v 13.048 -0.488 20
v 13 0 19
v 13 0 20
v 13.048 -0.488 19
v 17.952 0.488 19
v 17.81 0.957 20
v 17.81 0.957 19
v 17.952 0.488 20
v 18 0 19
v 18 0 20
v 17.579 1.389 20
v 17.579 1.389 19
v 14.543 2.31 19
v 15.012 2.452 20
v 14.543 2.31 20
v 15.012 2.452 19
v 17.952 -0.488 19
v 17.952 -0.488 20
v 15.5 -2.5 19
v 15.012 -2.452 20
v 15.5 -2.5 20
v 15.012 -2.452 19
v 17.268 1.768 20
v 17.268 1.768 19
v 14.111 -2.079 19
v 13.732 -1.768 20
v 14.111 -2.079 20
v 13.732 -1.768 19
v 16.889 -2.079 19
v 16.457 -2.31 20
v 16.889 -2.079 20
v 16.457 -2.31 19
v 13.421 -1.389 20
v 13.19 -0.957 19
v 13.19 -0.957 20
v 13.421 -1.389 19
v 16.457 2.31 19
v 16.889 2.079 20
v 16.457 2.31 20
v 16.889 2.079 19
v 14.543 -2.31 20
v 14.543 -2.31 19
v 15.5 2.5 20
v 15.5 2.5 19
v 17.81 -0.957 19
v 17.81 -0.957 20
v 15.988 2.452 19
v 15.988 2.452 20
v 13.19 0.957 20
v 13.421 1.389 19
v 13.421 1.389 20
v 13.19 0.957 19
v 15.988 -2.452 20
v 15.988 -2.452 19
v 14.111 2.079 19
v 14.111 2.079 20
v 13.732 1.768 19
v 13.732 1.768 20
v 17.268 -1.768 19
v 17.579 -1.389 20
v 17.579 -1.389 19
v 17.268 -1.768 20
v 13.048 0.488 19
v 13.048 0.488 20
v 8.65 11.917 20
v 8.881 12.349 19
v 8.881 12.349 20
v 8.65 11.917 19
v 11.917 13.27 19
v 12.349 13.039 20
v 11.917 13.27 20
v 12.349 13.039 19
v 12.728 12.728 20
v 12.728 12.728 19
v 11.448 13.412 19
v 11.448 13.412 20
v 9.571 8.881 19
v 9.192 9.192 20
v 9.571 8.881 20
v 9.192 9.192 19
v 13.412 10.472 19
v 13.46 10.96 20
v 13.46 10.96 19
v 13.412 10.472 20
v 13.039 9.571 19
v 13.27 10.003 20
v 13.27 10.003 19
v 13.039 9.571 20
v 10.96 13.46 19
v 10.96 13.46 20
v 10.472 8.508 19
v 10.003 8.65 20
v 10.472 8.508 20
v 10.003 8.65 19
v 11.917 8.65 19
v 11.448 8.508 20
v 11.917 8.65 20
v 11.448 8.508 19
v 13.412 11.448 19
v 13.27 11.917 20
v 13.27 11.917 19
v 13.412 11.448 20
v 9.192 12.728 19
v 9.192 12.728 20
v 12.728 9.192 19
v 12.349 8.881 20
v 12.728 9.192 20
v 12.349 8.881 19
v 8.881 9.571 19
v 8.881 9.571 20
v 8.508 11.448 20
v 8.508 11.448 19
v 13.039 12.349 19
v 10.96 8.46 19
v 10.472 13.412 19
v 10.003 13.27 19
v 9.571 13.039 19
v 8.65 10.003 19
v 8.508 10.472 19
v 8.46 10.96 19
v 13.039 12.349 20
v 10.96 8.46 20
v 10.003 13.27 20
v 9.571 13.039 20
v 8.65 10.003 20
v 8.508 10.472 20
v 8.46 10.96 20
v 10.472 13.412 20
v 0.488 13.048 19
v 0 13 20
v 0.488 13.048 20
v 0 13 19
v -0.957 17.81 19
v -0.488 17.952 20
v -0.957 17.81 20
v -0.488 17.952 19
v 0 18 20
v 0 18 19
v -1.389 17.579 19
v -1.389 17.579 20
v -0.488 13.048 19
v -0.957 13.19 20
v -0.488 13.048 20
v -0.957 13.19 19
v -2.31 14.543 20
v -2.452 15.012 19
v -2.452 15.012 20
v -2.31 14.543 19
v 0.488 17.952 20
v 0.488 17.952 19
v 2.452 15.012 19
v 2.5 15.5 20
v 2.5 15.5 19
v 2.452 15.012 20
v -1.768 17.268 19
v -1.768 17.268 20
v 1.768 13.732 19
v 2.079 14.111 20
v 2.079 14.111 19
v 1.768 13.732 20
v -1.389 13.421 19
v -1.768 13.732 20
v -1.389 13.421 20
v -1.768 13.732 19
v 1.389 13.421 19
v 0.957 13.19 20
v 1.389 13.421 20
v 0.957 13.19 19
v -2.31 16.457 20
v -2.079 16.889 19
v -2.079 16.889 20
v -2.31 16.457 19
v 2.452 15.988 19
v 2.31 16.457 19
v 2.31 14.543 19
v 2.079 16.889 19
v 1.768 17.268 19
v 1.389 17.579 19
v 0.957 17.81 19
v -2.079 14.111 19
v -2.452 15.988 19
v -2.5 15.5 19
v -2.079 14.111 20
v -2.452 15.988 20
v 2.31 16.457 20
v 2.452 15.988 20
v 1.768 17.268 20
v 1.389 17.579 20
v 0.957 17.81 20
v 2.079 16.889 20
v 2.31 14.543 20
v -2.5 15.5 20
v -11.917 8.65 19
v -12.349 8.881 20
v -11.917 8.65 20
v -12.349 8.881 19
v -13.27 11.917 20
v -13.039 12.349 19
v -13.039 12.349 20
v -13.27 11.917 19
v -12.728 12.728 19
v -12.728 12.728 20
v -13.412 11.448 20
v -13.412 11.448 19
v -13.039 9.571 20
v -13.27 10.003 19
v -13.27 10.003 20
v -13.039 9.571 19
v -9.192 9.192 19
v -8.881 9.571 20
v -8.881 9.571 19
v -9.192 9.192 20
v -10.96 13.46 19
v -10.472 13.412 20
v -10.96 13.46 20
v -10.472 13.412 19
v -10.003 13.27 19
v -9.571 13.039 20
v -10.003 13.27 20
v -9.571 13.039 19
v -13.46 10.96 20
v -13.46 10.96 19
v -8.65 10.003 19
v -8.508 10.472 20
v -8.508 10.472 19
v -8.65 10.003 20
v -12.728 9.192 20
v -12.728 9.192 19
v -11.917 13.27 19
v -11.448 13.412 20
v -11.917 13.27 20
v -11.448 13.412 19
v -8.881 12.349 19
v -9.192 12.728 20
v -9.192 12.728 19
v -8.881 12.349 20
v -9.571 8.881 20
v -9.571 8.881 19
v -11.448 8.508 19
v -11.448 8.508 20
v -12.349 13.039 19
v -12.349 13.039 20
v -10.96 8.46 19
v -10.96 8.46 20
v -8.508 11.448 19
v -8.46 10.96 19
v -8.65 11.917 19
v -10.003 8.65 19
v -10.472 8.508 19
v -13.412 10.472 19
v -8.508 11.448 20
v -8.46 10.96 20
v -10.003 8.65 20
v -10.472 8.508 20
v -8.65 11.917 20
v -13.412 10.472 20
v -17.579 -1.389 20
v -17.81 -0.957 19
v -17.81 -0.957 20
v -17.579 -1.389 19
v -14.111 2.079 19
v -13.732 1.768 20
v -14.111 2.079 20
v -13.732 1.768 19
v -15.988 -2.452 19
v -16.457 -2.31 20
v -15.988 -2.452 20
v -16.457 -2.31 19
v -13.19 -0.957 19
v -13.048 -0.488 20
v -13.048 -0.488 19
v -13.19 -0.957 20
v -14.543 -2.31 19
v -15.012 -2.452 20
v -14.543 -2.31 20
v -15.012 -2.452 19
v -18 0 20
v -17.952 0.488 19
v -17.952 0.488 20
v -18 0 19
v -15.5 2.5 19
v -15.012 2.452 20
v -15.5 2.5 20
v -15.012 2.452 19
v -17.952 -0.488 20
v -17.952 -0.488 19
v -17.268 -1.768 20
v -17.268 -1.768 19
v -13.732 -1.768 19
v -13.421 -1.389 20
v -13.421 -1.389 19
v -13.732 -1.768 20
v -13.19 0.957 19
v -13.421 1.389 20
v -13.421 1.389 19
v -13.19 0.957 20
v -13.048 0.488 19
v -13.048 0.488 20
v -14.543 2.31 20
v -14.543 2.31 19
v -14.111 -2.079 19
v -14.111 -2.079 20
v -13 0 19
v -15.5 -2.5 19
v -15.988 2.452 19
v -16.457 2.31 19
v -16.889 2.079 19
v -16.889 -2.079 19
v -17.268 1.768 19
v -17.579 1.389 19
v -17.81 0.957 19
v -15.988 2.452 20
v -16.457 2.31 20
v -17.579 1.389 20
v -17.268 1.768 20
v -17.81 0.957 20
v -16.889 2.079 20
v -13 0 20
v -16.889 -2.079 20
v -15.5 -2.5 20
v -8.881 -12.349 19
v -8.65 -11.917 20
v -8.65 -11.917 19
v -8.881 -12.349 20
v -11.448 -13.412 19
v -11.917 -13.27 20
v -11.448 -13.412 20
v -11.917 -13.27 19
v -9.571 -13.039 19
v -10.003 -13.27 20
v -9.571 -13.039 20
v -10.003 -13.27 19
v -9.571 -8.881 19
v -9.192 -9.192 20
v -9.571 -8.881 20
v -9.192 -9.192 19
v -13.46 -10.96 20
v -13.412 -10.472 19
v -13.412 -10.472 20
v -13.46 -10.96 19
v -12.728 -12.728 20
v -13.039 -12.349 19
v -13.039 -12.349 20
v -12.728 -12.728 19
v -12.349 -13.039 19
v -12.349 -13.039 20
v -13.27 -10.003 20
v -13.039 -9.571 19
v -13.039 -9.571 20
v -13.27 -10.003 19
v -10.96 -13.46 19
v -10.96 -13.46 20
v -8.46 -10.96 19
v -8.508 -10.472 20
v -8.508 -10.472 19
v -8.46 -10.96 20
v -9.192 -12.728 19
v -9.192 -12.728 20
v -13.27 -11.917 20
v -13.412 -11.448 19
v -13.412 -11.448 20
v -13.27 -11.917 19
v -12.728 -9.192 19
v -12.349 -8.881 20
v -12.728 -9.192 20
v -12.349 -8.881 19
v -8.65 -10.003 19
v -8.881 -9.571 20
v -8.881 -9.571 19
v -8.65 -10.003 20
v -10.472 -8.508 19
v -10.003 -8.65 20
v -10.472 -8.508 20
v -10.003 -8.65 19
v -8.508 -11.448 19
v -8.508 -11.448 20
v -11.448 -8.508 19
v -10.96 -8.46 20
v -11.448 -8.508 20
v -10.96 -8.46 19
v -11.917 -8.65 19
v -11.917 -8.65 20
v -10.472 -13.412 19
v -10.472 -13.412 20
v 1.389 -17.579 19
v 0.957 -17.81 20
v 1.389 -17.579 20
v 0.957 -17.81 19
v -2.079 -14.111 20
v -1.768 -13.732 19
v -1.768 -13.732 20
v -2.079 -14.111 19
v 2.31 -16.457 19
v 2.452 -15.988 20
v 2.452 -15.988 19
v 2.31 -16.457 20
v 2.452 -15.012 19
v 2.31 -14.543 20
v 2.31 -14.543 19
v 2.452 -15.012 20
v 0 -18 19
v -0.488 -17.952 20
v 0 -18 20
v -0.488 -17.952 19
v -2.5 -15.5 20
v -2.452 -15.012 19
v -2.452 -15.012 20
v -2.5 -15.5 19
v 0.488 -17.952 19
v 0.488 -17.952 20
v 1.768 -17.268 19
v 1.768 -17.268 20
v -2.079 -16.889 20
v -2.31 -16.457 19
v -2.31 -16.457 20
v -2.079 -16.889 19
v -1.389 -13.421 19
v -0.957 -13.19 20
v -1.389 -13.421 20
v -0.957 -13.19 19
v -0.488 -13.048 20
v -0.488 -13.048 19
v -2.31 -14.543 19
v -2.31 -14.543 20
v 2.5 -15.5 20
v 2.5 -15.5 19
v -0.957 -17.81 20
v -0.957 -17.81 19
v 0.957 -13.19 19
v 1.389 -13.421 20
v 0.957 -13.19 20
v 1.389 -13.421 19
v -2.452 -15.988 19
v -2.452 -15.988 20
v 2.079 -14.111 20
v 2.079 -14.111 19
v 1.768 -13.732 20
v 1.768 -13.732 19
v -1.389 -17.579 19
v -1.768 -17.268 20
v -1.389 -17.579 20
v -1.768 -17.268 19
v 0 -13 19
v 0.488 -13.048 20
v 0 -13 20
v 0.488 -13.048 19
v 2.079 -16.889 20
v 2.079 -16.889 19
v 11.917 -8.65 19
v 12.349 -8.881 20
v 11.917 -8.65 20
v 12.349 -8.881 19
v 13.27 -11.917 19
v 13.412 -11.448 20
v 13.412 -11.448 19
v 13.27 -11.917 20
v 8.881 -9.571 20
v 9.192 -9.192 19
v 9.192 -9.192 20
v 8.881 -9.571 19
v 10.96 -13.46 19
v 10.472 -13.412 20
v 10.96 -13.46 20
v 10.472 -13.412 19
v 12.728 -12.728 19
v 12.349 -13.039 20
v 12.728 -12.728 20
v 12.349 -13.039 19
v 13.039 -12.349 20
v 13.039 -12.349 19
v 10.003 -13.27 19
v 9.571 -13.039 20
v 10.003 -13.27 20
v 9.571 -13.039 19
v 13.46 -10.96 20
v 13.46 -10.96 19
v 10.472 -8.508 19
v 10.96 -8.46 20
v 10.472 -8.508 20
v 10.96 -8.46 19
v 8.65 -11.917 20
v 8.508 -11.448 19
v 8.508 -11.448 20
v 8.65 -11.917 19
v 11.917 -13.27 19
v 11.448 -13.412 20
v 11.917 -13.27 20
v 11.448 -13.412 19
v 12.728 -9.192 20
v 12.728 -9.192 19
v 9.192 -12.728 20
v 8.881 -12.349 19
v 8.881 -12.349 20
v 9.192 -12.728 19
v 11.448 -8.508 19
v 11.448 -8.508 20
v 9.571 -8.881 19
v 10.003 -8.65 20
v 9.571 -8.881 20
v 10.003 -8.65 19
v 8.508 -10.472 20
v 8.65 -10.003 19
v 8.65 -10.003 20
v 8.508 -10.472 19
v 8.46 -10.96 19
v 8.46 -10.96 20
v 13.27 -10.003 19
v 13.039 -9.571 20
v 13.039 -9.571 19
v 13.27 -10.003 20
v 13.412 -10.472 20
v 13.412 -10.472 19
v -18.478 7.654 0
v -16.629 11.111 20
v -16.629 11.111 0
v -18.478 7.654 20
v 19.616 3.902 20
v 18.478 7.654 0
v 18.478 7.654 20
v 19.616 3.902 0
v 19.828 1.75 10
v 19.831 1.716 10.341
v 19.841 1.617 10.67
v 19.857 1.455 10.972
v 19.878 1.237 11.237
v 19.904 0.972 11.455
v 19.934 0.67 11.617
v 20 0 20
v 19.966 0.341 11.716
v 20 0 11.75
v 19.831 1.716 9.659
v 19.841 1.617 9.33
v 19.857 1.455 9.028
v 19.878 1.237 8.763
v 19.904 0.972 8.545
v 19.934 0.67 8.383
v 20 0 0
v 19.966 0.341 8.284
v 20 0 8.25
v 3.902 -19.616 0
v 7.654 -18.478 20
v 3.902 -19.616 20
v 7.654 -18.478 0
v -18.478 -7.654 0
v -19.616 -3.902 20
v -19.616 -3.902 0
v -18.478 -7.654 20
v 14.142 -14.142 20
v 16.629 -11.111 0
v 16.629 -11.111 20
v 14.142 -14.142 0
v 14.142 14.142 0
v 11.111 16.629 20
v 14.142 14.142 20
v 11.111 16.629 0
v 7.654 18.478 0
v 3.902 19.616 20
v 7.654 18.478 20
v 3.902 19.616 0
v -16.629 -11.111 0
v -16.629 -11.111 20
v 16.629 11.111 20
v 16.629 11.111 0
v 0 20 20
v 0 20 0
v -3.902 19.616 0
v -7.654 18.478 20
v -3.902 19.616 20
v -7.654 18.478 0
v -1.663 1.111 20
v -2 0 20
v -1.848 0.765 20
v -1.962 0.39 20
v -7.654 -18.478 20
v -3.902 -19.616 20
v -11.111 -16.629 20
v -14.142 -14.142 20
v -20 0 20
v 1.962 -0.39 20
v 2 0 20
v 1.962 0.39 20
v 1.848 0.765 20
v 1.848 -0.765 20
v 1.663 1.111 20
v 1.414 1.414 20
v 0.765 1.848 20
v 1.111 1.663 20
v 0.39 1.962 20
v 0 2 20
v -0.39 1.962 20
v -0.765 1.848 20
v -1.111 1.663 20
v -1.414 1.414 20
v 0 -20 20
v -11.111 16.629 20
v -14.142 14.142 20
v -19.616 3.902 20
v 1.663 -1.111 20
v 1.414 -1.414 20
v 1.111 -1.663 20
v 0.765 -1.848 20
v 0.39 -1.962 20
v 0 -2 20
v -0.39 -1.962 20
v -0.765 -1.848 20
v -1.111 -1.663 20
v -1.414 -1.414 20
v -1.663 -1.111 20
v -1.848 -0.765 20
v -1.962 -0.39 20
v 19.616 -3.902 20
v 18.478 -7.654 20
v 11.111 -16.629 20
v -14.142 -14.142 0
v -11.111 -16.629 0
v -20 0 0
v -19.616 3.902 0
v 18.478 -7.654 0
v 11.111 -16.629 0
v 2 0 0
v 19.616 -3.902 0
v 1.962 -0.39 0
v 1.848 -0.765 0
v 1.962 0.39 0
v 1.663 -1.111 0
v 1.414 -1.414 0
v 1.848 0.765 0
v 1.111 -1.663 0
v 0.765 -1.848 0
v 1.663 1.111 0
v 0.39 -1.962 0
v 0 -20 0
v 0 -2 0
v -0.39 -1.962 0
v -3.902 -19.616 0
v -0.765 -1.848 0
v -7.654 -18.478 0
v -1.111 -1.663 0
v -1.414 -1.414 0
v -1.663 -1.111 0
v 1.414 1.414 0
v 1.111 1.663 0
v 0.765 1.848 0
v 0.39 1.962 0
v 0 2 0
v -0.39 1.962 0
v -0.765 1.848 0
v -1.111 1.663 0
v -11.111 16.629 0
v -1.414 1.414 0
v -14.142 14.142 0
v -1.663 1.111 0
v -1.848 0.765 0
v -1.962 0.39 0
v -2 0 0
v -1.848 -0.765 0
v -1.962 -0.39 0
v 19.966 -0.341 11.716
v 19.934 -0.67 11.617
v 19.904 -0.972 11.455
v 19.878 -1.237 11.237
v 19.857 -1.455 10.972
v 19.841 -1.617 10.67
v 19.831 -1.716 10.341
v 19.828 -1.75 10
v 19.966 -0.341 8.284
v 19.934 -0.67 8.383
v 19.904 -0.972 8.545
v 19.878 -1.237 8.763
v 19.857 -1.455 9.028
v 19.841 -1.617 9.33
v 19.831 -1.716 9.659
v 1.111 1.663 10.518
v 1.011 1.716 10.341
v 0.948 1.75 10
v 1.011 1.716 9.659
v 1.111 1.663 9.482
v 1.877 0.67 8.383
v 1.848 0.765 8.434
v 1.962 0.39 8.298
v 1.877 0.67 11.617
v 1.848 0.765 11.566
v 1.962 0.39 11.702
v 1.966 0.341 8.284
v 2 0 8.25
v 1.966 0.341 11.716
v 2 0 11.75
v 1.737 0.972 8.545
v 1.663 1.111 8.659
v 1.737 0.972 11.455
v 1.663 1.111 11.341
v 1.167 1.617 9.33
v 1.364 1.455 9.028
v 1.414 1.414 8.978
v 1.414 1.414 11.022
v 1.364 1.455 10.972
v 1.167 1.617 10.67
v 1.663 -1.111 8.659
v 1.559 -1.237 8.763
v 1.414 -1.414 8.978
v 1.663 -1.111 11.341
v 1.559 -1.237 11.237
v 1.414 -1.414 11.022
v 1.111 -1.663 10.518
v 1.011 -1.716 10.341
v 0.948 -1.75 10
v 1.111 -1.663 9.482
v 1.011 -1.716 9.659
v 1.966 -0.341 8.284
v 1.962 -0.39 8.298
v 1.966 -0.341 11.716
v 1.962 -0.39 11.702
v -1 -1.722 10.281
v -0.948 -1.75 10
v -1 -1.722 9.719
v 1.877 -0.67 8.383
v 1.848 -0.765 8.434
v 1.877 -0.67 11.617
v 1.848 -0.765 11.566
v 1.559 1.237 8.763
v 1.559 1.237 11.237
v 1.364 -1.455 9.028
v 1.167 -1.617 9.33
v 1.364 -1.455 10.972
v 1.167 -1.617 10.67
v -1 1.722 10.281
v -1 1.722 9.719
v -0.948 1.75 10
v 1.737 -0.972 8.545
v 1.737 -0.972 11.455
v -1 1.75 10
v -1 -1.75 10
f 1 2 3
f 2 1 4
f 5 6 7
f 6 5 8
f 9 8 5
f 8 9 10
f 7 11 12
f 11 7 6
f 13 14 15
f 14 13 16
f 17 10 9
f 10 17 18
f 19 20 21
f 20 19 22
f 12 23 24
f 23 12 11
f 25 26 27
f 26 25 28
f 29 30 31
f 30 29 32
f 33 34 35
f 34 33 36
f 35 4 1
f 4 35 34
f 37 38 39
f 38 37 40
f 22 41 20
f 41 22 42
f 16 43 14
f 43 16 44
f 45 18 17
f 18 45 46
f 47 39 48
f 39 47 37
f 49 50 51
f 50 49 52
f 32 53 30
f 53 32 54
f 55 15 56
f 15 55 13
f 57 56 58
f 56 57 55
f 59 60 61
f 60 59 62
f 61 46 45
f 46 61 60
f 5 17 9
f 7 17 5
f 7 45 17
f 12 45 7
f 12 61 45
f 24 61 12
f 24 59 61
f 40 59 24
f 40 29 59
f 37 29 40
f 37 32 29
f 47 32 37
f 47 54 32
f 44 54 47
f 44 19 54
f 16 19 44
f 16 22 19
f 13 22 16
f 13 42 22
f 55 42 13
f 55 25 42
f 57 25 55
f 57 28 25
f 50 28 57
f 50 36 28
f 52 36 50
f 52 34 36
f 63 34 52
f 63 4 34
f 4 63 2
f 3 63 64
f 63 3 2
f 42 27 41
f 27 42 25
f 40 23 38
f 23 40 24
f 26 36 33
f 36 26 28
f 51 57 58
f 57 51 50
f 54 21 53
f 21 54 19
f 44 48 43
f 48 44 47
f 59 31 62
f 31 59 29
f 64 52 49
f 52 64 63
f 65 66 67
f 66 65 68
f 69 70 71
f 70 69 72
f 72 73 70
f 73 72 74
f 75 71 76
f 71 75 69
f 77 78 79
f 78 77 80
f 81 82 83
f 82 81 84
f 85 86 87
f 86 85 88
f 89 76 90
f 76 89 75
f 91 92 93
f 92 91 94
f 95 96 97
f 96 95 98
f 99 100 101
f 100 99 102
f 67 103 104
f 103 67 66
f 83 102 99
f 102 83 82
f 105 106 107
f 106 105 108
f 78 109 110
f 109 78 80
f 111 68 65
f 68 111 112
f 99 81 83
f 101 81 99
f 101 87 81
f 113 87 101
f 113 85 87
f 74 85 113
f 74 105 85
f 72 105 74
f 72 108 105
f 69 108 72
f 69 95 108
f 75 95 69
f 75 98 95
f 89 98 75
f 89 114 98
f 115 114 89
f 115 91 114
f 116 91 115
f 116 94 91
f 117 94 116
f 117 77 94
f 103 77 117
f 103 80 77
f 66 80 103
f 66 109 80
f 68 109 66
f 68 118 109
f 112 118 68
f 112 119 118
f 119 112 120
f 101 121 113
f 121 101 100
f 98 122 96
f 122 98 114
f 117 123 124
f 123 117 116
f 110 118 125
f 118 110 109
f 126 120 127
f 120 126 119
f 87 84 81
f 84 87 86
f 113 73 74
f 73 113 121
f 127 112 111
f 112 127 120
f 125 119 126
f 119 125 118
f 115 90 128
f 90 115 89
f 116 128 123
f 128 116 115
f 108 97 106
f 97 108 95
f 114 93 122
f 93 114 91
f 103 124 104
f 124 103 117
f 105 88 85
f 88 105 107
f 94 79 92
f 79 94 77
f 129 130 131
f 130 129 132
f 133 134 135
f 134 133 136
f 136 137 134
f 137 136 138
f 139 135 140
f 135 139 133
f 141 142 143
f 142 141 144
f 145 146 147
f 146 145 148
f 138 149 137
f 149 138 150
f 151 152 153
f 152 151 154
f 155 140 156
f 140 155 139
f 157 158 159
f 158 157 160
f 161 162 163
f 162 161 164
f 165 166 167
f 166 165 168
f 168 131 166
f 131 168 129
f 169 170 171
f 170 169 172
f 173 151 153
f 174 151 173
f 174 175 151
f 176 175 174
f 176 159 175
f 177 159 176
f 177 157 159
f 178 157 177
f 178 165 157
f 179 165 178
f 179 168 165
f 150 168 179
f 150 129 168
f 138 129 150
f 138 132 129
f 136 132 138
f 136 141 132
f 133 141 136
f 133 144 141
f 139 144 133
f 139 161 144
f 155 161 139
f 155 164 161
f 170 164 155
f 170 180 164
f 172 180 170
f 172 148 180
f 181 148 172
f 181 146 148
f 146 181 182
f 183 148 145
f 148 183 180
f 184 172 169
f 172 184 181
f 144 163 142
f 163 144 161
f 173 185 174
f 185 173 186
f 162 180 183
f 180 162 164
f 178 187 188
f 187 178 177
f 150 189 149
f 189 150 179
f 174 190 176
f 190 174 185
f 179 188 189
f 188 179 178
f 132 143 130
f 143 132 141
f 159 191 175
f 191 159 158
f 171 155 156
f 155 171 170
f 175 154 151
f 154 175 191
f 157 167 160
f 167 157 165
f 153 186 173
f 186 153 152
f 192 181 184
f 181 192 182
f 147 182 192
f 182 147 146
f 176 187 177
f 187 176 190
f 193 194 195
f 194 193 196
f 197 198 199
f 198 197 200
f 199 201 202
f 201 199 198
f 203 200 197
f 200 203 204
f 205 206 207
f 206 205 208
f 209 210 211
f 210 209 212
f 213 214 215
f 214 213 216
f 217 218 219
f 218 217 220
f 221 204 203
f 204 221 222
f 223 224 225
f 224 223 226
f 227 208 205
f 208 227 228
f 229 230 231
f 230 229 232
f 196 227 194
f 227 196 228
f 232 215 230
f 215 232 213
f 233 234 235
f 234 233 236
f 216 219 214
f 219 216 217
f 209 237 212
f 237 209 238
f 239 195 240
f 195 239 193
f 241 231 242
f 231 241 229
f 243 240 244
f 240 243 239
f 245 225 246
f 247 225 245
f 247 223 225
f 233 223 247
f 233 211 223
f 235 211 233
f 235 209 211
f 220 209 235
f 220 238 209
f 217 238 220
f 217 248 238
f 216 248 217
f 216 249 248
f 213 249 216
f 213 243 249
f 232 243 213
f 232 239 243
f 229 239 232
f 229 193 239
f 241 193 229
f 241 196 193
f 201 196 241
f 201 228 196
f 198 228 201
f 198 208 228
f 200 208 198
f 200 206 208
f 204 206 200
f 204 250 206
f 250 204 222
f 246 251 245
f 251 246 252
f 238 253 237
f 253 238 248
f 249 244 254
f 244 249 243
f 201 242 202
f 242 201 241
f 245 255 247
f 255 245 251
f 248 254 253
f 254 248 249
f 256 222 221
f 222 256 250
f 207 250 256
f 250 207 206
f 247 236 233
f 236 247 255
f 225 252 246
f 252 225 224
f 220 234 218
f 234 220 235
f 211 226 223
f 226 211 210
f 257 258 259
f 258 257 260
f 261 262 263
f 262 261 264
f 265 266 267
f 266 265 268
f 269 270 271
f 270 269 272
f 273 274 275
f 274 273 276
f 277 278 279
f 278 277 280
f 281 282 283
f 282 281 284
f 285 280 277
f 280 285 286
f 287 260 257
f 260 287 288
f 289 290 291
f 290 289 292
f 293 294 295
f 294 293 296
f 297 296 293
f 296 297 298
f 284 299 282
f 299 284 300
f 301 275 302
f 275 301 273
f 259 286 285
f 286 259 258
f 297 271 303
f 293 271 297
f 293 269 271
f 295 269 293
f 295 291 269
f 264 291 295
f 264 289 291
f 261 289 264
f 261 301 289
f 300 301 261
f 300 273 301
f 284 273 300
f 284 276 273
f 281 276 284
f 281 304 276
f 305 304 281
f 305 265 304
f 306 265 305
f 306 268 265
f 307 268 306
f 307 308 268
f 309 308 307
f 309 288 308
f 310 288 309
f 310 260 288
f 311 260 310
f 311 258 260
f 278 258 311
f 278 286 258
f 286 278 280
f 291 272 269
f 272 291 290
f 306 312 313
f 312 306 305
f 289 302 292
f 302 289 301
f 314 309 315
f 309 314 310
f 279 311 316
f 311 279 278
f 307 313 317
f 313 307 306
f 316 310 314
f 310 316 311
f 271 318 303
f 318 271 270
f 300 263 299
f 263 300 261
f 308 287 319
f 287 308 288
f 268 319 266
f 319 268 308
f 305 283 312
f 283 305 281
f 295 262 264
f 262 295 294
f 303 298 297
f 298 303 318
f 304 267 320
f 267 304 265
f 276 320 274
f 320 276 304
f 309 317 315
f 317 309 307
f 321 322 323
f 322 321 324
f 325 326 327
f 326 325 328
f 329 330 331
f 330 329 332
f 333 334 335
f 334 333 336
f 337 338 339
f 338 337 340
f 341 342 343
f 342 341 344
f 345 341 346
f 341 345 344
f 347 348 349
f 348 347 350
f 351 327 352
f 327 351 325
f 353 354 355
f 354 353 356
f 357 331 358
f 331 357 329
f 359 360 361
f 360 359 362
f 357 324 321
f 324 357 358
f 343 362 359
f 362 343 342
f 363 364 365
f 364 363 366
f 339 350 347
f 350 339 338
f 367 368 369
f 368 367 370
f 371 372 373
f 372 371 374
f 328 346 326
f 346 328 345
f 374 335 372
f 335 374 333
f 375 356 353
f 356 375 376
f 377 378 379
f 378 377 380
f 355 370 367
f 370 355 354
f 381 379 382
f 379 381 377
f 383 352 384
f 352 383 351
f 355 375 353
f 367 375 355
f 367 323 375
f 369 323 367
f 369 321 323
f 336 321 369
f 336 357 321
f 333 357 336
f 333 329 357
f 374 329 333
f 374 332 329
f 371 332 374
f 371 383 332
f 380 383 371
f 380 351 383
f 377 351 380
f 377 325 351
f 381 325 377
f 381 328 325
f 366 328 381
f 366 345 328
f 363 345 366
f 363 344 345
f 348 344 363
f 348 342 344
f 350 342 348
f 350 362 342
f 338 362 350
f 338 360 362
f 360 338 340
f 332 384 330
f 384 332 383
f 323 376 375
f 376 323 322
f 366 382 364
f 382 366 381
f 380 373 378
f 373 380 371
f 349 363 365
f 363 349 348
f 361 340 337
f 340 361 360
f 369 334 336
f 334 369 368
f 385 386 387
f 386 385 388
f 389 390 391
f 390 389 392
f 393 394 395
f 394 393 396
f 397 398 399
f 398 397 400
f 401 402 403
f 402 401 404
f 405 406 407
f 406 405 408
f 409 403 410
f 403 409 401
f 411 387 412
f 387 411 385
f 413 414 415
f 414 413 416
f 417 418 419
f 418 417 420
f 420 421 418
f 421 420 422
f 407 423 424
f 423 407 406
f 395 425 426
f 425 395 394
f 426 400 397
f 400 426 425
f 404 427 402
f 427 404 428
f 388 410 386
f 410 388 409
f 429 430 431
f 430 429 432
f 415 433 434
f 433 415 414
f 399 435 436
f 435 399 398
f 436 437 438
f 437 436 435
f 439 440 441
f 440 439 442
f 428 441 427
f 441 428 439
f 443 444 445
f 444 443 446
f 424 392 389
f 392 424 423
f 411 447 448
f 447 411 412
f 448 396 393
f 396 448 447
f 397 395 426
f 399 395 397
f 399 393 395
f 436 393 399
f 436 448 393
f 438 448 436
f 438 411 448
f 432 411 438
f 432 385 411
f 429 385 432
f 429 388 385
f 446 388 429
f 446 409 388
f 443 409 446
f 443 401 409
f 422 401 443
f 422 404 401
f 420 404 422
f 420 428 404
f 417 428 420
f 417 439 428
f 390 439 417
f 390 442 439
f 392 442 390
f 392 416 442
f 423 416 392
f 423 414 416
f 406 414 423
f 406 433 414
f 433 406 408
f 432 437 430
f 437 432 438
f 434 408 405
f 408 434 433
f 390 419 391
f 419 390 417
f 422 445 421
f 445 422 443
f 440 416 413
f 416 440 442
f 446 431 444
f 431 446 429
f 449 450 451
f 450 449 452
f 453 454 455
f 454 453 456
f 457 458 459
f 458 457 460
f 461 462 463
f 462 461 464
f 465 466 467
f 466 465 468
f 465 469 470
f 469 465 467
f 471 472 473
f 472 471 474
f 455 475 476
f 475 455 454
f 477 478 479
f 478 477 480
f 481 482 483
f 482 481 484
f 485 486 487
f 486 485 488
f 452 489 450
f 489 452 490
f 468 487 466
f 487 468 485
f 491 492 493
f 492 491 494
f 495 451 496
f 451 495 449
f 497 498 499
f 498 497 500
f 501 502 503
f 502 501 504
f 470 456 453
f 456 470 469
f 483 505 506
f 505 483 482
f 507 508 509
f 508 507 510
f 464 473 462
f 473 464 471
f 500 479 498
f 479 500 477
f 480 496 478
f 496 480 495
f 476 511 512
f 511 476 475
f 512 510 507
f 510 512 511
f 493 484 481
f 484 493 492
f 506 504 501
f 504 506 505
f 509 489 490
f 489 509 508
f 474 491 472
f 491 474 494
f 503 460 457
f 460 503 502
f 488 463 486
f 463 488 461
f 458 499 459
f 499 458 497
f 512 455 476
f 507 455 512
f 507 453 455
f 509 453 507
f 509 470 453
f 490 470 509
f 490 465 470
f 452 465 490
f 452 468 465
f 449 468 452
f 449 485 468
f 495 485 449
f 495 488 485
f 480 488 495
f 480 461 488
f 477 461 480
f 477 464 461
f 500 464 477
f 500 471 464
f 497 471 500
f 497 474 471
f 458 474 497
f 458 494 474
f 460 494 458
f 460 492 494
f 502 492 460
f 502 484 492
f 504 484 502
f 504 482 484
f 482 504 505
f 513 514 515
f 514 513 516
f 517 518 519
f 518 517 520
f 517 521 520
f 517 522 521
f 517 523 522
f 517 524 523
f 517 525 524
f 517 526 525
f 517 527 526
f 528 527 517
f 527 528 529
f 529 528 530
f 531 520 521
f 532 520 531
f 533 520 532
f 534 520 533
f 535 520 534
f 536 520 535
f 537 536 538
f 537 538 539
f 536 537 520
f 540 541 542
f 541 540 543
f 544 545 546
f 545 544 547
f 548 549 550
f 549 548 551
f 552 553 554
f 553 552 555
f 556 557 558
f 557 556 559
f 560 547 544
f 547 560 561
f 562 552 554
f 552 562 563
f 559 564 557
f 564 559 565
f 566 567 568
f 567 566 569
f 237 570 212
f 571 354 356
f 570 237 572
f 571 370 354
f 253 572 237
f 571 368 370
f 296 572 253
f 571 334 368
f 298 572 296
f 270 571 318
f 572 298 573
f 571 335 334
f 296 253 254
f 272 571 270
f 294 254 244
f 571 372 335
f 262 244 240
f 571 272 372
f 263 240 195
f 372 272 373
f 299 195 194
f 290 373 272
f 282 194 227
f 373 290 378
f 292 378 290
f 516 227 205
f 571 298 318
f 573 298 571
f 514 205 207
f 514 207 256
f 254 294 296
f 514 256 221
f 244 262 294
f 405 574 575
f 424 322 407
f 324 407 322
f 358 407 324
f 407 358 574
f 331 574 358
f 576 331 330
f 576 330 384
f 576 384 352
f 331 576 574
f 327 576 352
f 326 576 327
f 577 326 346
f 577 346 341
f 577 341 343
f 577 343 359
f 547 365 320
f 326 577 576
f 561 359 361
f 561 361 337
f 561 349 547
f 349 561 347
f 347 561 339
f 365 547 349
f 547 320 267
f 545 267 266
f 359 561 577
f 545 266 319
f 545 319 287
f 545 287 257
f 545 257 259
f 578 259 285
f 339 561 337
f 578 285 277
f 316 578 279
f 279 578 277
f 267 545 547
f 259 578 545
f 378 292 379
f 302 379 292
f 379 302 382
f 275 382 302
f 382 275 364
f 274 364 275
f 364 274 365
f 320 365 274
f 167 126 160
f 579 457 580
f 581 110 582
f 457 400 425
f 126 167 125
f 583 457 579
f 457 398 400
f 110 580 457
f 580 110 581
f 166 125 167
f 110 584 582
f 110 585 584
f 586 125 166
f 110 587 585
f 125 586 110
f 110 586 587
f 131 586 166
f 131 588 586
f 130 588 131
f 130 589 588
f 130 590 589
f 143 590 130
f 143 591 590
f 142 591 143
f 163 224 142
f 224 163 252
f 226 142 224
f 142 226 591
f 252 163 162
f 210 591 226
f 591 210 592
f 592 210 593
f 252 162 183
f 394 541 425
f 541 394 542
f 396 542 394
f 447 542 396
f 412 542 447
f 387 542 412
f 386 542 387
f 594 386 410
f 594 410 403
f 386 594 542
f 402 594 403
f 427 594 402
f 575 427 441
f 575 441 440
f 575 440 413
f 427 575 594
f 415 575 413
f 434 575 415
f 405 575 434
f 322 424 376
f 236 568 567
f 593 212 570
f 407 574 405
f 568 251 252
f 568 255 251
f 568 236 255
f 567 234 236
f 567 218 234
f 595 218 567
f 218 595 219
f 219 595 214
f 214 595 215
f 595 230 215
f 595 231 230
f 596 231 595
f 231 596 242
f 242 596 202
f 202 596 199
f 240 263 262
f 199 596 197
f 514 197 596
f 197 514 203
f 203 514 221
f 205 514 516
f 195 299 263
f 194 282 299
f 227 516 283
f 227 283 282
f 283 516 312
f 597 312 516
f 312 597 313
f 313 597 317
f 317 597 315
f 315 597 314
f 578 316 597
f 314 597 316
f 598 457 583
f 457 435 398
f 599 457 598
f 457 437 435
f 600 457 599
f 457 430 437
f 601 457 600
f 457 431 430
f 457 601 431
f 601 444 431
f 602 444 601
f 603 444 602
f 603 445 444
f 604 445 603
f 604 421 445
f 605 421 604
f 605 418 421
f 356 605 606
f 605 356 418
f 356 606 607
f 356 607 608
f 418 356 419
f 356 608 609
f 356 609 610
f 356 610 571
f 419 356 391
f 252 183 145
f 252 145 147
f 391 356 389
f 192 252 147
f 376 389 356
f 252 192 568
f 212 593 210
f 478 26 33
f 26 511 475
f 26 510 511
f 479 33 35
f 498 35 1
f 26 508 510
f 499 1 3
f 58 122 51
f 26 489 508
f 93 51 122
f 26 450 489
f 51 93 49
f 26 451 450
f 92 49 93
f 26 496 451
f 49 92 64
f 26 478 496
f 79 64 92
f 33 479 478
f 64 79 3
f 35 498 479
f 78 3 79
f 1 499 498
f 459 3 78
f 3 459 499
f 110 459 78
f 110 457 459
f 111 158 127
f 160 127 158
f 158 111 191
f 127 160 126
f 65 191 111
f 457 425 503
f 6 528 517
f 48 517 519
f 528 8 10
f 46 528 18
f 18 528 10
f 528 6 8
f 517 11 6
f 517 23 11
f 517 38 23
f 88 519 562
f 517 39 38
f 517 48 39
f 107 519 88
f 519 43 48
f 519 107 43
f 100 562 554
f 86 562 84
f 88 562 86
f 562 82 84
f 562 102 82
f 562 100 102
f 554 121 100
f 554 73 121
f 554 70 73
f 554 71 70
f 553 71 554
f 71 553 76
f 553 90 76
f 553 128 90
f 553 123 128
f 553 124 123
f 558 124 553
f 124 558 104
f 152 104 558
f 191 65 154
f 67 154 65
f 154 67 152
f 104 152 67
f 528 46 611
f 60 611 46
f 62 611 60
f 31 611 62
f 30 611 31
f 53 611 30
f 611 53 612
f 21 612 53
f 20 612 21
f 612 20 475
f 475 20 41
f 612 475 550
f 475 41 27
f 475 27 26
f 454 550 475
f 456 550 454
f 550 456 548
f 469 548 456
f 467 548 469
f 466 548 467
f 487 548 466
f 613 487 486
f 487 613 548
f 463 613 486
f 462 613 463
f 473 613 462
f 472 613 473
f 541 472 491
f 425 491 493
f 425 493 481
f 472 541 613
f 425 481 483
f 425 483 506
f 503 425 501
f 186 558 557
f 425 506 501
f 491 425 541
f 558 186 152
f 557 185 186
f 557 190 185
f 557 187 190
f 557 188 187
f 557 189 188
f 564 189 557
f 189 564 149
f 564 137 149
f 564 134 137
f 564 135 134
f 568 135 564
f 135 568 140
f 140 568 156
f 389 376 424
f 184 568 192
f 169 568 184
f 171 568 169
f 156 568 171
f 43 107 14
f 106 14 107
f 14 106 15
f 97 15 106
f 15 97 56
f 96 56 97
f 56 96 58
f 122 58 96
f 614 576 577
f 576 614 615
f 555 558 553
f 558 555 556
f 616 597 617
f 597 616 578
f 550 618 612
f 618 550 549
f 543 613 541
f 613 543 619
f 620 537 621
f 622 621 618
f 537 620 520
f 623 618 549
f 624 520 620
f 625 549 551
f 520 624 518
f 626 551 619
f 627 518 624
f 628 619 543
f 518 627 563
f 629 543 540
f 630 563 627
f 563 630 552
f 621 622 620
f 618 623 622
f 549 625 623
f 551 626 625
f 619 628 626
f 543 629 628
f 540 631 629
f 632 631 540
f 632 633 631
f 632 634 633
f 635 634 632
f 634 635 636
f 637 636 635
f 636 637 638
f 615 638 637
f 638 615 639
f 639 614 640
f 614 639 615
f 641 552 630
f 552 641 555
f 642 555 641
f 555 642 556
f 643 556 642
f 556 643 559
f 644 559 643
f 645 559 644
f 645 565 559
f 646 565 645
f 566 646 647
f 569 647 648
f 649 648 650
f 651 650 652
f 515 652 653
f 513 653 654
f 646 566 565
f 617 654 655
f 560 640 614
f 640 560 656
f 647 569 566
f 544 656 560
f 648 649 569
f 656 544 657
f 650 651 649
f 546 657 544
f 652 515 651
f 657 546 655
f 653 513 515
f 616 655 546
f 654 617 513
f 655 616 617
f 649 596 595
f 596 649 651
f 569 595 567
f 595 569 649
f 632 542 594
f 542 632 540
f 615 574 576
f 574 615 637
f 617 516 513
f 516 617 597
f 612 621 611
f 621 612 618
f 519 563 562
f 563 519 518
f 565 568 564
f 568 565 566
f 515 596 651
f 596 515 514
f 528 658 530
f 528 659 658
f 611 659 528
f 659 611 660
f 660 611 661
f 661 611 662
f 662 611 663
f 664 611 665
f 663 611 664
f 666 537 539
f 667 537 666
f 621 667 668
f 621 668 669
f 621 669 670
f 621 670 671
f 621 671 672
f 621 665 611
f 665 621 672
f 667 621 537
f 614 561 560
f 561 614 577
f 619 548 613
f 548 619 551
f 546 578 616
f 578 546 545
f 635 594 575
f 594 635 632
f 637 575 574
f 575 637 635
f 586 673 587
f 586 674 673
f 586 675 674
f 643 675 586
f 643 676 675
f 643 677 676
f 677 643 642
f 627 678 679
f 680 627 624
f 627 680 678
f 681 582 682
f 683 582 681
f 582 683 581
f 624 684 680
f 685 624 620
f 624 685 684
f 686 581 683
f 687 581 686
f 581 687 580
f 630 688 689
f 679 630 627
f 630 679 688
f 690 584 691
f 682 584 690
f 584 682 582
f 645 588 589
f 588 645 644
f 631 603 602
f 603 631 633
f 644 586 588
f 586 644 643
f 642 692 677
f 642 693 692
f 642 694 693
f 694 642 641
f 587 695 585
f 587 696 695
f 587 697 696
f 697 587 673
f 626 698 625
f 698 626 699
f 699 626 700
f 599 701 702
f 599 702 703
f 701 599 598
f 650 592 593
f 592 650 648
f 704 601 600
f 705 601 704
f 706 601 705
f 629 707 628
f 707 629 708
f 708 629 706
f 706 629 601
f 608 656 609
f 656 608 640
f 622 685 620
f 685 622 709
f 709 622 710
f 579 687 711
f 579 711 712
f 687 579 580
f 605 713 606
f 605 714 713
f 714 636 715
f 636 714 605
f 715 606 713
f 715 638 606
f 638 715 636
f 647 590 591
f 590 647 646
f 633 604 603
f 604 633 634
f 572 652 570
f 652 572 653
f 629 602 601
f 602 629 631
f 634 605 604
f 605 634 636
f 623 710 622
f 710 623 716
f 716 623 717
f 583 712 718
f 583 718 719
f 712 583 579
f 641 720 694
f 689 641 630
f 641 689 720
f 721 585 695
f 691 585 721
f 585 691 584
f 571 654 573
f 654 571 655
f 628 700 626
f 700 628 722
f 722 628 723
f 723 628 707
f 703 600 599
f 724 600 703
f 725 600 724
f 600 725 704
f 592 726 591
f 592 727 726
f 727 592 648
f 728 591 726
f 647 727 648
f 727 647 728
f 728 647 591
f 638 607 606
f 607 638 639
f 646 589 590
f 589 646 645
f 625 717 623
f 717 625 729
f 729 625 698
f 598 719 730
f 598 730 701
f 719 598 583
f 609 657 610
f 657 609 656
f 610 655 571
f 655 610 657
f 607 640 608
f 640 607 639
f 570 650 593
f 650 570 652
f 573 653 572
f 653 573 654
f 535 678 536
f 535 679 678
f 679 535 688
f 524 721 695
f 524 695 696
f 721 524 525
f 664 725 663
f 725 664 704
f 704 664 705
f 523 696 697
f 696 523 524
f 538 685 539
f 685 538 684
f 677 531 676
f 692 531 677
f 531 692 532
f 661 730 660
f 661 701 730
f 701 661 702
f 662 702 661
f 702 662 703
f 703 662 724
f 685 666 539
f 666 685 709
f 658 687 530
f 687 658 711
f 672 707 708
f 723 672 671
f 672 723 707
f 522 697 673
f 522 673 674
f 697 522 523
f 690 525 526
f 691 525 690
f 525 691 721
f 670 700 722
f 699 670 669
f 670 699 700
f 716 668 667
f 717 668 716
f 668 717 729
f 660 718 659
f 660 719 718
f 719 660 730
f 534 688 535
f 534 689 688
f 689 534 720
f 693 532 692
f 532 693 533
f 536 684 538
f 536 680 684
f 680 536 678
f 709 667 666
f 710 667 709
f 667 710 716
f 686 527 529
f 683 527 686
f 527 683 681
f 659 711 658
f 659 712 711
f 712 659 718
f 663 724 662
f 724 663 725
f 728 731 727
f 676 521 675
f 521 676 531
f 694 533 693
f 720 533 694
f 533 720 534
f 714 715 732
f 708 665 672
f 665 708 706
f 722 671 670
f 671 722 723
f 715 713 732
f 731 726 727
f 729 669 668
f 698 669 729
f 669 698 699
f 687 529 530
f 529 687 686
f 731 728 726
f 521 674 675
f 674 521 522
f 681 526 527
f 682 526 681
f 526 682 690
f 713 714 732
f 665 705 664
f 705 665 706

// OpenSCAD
$fn = 32;

// ----------------------------------------------------------------------
// Control knob: dimpled knob
// ----------------------------------------------------------------------

// --- parameters (mm) ---
dimp_d = 5;               // finger dimple diameter
n_dimp = 8;               // number of dimples
dimp_r = 15.5;            // dimple ring radius
knob_d = 40;              // knob body diameter
knob_h = 20;              // knob body height
bore_d = 4;               // shaft bore diameter
set_d = 3.5;              // set screw bore diameter
fit_tol = 0.1;            // tolerance for press fits, mm
free_tol = 0.5;           // tolerance for clearance fits, mm

dimp_step = 360 / n_dimp;  // dimple angular step

difference() {
  cylinder(h = knob_h, d = knob_d);
  translate([0, 0, -1]) cylinder(h = knob_h + 2, d = bore_d);
  translate([-1, 0, knob_h / 2]) rotate([0, 90, 0])
    cylinder(h = knob_d / 2 + bore_d / 2 + 2, d = set_d);  for (i = [0 : n_dimp - 1])
    rotate([0, 0, i * dimp_step])
      translate([dimp_r, 0, knob_h - 1])
        cylinder(h = 2, d = dimp_d);
}
